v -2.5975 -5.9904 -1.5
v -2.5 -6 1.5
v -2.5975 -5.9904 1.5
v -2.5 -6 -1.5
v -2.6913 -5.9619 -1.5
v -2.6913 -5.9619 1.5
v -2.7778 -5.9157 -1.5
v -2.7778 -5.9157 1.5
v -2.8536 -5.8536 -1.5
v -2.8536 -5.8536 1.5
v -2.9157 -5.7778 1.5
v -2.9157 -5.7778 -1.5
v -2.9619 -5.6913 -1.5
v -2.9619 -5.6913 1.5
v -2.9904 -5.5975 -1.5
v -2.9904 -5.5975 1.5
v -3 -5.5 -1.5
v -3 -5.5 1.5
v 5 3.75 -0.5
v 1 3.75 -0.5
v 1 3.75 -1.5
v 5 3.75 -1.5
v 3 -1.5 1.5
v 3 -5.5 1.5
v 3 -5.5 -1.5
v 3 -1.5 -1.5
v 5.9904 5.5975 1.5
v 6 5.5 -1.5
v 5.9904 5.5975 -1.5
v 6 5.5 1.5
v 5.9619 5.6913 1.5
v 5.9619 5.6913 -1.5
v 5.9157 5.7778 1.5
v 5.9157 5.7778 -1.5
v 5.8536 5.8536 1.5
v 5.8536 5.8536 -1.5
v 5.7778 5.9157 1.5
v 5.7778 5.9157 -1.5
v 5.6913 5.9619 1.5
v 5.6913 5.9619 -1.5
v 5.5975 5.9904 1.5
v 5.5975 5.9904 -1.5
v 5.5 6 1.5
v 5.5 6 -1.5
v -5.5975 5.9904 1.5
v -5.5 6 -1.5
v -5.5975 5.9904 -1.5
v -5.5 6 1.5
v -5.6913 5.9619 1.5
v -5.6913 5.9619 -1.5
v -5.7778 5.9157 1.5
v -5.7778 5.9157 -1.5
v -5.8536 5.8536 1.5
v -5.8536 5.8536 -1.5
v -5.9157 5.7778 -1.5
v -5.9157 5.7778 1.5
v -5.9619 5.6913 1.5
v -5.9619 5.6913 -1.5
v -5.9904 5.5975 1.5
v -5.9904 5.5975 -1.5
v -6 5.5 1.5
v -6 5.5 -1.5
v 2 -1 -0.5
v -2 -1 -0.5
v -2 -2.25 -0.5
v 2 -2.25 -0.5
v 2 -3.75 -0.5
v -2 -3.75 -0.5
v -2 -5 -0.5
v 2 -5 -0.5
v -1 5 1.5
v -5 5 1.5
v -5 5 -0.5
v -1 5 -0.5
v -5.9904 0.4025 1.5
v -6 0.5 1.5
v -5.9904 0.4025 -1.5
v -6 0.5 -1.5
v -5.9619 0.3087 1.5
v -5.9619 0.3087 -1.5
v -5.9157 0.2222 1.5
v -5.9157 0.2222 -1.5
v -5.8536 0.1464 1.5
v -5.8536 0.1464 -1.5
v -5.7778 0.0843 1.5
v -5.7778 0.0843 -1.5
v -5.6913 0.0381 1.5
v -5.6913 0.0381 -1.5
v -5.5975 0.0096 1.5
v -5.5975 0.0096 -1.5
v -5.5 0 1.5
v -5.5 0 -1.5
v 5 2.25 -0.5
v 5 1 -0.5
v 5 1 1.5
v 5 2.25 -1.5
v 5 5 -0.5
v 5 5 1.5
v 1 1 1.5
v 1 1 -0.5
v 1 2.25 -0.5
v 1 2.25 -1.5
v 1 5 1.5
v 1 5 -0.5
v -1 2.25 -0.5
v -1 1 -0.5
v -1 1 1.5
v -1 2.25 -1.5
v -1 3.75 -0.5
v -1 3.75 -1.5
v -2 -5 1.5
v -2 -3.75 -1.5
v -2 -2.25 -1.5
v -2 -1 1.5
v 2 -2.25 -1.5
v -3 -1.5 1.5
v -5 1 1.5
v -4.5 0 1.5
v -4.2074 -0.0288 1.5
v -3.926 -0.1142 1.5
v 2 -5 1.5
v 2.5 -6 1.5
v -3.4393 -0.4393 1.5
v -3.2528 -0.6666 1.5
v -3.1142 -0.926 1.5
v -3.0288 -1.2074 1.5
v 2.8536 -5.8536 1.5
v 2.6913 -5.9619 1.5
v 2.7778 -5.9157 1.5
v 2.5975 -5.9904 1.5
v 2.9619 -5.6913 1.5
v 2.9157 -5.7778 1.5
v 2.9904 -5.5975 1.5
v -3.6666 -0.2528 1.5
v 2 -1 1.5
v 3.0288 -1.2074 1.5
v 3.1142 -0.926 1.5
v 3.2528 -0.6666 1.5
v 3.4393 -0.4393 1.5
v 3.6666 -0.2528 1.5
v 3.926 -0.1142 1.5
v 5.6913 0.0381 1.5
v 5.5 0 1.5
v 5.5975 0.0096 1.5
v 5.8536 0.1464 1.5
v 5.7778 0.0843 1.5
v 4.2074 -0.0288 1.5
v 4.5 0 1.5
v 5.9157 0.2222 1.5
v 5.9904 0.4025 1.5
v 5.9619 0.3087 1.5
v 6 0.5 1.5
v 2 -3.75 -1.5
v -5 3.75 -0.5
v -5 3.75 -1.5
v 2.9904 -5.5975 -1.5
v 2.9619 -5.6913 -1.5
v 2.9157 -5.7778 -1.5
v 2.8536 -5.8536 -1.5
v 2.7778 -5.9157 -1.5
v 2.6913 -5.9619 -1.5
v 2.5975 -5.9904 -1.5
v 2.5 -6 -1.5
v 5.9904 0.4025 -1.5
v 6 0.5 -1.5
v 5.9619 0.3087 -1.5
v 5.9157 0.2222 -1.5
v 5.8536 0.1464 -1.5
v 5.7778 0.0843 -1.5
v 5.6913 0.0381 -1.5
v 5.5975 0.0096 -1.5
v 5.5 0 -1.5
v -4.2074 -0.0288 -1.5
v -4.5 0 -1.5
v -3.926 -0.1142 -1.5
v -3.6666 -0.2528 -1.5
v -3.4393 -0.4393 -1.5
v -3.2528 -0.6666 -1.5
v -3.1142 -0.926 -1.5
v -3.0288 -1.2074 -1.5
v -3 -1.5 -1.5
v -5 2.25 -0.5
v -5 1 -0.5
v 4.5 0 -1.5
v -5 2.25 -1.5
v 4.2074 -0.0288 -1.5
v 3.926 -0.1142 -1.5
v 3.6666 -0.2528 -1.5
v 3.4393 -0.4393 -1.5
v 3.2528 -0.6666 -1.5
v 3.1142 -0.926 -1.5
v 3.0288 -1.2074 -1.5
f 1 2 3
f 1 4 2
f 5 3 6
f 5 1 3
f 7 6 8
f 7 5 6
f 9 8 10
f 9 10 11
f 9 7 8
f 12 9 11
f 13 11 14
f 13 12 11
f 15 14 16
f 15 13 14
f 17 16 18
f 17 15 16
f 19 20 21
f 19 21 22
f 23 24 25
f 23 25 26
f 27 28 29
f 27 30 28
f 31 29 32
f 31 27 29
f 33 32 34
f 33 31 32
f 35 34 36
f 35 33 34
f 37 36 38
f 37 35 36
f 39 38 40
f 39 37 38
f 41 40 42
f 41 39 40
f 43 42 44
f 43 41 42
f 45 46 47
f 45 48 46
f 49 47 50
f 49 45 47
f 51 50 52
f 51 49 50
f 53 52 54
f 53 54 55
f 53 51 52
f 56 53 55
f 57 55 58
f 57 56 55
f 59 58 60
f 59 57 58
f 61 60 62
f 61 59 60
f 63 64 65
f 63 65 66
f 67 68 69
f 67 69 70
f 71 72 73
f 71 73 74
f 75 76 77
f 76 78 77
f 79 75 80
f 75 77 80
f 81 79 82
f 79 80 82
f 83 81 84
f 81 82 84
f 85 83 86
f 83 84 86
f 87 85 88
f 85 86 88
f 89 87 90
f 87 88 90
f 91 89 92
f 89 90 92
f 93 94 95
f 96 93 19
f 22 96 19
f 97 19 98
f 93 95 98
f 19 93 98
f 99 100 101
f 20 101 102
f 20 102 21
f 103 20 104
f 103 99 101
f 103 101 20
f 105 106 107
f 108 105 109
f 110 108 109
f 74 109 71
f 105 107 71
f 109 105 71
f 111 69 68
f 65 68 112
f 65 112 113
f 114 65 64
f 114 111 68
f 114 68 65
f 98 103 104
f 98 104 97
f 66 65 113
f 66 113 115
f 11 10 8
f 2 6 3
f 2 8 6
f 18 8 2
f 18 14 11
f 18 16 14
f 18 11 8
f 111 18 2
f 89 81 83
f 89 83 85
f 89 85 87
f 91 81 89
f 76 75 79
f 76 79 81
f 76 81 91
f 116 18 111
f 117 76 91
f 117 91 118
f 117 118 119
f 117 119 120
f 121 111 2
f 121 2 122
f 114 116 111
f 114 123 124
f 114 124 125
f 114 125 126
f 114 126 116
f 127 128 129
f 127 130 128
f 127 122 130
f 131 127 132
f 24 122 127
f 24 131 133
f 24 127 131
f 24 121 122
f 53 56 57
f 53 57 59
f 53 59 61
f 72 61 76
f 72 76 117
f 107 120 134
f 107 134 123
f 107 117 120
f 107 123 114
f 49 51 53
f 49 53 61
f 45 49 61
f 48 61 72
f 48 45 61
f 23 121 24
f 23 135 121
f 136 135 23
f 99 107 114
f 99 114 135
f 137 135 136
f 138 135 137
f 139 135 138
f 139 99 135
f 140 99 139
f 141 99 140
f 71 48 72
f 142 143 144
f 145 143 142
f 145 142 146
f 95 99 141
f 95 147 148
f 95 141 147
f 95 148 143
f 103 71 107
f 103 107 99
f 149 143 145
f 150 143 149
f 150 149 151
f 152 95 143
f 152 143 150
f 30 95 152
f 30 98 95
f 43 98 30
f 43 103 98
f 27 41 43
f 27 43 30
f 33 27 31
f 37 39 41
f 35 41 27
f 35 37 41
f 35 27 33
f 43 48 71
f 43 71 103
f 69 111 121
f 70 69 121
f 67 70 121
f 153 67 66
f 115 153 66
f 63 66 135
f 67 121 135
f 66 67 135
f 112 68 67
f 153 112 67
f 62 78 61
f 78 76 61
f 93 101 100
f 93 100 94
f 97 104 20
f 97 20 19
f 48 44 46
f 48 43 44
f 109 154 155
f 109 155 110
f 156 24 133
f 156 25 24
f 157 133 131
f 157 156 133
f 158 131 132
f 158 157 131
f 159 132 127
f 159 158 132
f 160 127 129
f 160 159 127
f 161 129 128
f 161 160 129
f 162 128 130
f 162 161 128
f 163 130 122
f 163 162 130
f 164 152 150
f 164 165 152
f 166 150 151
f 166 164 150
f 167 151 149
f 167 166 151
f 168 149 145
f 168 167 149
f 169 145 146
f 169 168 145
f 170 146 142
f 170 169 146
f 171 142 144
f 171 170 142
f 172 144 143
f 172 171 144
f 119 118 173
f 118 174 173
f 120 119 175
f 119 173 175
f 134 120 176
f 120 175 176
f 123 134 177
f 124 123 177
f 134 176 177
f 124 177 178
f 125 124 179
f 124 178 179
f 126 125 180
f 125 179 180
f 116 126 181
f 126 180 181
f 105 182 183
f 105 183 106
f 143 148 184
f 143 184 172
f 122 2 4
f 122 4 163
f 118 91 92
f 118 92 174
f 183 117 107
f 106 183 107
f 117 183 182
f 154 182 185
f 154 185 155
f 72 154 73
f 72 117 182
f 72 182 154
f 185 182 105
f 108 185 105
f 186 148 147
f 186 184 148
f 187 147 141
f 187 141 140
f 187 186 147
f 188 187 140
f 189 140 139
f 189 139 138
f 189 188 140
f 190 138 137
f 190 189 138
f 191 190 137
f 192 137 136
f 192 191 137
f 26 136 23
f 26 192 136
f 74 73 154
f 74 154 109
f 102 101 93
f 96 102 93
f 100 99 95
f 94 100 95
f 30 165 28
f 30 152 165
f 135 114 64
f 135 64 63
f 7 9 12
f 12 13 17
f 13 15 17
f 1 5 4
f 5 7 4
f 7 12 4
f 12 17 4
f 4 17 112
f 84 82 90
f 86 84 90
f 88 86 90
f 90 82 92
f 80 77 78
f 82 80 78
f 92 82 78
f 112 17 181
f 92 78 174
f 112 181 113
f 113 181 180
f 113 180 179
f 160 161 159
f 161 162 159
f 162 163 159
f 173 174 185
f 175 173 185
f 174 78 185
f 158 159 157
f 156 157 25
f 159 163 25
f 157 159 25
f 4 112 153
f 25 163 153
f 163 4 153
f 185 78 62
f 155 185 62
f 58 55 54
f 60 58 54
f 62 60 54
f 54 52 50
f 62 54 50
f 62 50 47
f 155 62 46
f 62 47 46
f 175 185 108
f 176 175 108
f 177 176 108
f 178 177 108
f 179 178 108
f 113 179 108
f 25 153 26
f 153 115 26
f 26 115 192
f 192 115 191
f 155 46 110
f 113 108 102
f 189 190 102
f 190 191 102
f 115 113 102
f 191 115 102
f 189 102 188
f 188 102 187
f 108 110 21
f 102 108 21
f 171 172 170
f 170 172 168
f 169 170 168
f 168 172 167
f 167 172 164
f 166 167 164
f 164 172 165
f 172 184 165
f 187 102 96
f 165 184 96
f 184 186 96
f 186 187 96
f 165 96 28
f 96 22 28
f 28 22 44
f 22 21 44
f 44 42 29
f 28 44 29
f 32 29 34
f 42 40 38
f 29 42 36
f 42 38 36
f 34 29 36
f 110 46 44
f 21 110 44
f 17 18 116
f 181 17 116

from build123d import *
from OCP.BRepFilletAPI import BRepFilletAPI_MakeFillet

# Parameters (mm, degrees)
SKETCH1_W           = 6
SKETCH1_H           = 6
BOSS_EXTRUDE1_DEPTH = 1.5
SKETCH5_W           = 6
SKETCH5_H           = 6
BOSS_EXTRUDE2_DEPTH = 3
SKETCH2_W           = 4
SKETCH2_H           = 4
CUT_EXTRUDE1_DEPTH  = 2
SKETCH10_W          = 4
SKETCH10_H          = 1.5
CUT_EXTRUDE3_DEPTH  = 9.717797887
FILLET7_R1          = 0.5
FILLET7_R2          = 1.5


with BuildPart() as part:
    # Sketch1 → Boss-Extrude1 (new, symmetric)
    with BuildSketch(Plane.XY):
        with Locations((3, 3)):
            Rectangle(SKETCH1_W, SKETCH1_H)
        with Locations((-3, 3)):
            Rectangle(SKETCH1_W, SKETCH1_H)
    extrude(amount=BOSS_EXTRUDE1_DEPTH, both=True)

    # Sketch5 → Boss-Extrude2 (add)
    with BuildSketch(Plane.XY.offset(1.5)):
        with Locations((0, -3)):
            Rectangle(SKETCH5_W, SKETCH5_H)
    extrude(amount=-BOSS_EXTRUDE2_DEPTH)

    # Sketch2 → Cut-Extrude1 (cut)
    with BuildSketch(Plane.XY.offset(1.5)):
        with Locations((3, 3)):
            Rectangle(SKETCH2_W, SKETCH2_H)
        with Locations((-3, 3)):
            Rectangle(SKETCH2_W, SKETCH2_H)
        with Locations((0, -3)):
            Rectangle(SKETCH2_W, SKETCH2_H)
    extrude(amount=-CUT_EXTRUDE1_DEPTH, mode=Mode.SUBTRACT)

    # Sketch10 → Cut-Extrude3 (cut, through all)
    with BuildSketch(Plane.XY.offset(-0.5)):
        with Locations((0, -3)):
            Rectangle(SKETCH10_W, SKETCH10_H)
        with Locations((3, 3)):
            Rectangle(SKETCH10_W, SKETCH10_H)
        with Locations((-3, 3)):
            Rectangle(SKETCH10_W, SKETCH10_H)
    extrude(amount=-CUT_EXTRUDE3_DEPTH, mode=Mode.SUBTRACT)

    # Fillet7: one fillet with a radius per group of edges: ONE call of the kernel's fillet builder (fillet() takes one radius for all edges)
    fillet7_edges_1 = [part.edges().sort_by_distance(p)[0] for p in [
        (6, 0, 0),
        (3, -6, 0),
        (6, 6, 0),
        (-6, 6, 0),
        (-6, 0, 0),
        (-3, -6, 0),
    ]]
    fillet7_edges_2 = [part.edges().sort_by_distance(p)[0] for p in [
        (3, 0, 0),
        (-3, 0, 0),
    ]]
    fillet7 = BRepFilletAPI_MakeFillet(part.part.solid().wrapped)
    for e in fillet7_edges_1:
        fillet7.Add(FILLET7_R1, e.wrapped)
    for e in fillet7_edges_2:
        fillet7.Add(FILLET7_R2, e.wrapped)
    add(Compound.cast(fillet7.Shape()), mode=Mode.REPLACE)


solid = part.part
